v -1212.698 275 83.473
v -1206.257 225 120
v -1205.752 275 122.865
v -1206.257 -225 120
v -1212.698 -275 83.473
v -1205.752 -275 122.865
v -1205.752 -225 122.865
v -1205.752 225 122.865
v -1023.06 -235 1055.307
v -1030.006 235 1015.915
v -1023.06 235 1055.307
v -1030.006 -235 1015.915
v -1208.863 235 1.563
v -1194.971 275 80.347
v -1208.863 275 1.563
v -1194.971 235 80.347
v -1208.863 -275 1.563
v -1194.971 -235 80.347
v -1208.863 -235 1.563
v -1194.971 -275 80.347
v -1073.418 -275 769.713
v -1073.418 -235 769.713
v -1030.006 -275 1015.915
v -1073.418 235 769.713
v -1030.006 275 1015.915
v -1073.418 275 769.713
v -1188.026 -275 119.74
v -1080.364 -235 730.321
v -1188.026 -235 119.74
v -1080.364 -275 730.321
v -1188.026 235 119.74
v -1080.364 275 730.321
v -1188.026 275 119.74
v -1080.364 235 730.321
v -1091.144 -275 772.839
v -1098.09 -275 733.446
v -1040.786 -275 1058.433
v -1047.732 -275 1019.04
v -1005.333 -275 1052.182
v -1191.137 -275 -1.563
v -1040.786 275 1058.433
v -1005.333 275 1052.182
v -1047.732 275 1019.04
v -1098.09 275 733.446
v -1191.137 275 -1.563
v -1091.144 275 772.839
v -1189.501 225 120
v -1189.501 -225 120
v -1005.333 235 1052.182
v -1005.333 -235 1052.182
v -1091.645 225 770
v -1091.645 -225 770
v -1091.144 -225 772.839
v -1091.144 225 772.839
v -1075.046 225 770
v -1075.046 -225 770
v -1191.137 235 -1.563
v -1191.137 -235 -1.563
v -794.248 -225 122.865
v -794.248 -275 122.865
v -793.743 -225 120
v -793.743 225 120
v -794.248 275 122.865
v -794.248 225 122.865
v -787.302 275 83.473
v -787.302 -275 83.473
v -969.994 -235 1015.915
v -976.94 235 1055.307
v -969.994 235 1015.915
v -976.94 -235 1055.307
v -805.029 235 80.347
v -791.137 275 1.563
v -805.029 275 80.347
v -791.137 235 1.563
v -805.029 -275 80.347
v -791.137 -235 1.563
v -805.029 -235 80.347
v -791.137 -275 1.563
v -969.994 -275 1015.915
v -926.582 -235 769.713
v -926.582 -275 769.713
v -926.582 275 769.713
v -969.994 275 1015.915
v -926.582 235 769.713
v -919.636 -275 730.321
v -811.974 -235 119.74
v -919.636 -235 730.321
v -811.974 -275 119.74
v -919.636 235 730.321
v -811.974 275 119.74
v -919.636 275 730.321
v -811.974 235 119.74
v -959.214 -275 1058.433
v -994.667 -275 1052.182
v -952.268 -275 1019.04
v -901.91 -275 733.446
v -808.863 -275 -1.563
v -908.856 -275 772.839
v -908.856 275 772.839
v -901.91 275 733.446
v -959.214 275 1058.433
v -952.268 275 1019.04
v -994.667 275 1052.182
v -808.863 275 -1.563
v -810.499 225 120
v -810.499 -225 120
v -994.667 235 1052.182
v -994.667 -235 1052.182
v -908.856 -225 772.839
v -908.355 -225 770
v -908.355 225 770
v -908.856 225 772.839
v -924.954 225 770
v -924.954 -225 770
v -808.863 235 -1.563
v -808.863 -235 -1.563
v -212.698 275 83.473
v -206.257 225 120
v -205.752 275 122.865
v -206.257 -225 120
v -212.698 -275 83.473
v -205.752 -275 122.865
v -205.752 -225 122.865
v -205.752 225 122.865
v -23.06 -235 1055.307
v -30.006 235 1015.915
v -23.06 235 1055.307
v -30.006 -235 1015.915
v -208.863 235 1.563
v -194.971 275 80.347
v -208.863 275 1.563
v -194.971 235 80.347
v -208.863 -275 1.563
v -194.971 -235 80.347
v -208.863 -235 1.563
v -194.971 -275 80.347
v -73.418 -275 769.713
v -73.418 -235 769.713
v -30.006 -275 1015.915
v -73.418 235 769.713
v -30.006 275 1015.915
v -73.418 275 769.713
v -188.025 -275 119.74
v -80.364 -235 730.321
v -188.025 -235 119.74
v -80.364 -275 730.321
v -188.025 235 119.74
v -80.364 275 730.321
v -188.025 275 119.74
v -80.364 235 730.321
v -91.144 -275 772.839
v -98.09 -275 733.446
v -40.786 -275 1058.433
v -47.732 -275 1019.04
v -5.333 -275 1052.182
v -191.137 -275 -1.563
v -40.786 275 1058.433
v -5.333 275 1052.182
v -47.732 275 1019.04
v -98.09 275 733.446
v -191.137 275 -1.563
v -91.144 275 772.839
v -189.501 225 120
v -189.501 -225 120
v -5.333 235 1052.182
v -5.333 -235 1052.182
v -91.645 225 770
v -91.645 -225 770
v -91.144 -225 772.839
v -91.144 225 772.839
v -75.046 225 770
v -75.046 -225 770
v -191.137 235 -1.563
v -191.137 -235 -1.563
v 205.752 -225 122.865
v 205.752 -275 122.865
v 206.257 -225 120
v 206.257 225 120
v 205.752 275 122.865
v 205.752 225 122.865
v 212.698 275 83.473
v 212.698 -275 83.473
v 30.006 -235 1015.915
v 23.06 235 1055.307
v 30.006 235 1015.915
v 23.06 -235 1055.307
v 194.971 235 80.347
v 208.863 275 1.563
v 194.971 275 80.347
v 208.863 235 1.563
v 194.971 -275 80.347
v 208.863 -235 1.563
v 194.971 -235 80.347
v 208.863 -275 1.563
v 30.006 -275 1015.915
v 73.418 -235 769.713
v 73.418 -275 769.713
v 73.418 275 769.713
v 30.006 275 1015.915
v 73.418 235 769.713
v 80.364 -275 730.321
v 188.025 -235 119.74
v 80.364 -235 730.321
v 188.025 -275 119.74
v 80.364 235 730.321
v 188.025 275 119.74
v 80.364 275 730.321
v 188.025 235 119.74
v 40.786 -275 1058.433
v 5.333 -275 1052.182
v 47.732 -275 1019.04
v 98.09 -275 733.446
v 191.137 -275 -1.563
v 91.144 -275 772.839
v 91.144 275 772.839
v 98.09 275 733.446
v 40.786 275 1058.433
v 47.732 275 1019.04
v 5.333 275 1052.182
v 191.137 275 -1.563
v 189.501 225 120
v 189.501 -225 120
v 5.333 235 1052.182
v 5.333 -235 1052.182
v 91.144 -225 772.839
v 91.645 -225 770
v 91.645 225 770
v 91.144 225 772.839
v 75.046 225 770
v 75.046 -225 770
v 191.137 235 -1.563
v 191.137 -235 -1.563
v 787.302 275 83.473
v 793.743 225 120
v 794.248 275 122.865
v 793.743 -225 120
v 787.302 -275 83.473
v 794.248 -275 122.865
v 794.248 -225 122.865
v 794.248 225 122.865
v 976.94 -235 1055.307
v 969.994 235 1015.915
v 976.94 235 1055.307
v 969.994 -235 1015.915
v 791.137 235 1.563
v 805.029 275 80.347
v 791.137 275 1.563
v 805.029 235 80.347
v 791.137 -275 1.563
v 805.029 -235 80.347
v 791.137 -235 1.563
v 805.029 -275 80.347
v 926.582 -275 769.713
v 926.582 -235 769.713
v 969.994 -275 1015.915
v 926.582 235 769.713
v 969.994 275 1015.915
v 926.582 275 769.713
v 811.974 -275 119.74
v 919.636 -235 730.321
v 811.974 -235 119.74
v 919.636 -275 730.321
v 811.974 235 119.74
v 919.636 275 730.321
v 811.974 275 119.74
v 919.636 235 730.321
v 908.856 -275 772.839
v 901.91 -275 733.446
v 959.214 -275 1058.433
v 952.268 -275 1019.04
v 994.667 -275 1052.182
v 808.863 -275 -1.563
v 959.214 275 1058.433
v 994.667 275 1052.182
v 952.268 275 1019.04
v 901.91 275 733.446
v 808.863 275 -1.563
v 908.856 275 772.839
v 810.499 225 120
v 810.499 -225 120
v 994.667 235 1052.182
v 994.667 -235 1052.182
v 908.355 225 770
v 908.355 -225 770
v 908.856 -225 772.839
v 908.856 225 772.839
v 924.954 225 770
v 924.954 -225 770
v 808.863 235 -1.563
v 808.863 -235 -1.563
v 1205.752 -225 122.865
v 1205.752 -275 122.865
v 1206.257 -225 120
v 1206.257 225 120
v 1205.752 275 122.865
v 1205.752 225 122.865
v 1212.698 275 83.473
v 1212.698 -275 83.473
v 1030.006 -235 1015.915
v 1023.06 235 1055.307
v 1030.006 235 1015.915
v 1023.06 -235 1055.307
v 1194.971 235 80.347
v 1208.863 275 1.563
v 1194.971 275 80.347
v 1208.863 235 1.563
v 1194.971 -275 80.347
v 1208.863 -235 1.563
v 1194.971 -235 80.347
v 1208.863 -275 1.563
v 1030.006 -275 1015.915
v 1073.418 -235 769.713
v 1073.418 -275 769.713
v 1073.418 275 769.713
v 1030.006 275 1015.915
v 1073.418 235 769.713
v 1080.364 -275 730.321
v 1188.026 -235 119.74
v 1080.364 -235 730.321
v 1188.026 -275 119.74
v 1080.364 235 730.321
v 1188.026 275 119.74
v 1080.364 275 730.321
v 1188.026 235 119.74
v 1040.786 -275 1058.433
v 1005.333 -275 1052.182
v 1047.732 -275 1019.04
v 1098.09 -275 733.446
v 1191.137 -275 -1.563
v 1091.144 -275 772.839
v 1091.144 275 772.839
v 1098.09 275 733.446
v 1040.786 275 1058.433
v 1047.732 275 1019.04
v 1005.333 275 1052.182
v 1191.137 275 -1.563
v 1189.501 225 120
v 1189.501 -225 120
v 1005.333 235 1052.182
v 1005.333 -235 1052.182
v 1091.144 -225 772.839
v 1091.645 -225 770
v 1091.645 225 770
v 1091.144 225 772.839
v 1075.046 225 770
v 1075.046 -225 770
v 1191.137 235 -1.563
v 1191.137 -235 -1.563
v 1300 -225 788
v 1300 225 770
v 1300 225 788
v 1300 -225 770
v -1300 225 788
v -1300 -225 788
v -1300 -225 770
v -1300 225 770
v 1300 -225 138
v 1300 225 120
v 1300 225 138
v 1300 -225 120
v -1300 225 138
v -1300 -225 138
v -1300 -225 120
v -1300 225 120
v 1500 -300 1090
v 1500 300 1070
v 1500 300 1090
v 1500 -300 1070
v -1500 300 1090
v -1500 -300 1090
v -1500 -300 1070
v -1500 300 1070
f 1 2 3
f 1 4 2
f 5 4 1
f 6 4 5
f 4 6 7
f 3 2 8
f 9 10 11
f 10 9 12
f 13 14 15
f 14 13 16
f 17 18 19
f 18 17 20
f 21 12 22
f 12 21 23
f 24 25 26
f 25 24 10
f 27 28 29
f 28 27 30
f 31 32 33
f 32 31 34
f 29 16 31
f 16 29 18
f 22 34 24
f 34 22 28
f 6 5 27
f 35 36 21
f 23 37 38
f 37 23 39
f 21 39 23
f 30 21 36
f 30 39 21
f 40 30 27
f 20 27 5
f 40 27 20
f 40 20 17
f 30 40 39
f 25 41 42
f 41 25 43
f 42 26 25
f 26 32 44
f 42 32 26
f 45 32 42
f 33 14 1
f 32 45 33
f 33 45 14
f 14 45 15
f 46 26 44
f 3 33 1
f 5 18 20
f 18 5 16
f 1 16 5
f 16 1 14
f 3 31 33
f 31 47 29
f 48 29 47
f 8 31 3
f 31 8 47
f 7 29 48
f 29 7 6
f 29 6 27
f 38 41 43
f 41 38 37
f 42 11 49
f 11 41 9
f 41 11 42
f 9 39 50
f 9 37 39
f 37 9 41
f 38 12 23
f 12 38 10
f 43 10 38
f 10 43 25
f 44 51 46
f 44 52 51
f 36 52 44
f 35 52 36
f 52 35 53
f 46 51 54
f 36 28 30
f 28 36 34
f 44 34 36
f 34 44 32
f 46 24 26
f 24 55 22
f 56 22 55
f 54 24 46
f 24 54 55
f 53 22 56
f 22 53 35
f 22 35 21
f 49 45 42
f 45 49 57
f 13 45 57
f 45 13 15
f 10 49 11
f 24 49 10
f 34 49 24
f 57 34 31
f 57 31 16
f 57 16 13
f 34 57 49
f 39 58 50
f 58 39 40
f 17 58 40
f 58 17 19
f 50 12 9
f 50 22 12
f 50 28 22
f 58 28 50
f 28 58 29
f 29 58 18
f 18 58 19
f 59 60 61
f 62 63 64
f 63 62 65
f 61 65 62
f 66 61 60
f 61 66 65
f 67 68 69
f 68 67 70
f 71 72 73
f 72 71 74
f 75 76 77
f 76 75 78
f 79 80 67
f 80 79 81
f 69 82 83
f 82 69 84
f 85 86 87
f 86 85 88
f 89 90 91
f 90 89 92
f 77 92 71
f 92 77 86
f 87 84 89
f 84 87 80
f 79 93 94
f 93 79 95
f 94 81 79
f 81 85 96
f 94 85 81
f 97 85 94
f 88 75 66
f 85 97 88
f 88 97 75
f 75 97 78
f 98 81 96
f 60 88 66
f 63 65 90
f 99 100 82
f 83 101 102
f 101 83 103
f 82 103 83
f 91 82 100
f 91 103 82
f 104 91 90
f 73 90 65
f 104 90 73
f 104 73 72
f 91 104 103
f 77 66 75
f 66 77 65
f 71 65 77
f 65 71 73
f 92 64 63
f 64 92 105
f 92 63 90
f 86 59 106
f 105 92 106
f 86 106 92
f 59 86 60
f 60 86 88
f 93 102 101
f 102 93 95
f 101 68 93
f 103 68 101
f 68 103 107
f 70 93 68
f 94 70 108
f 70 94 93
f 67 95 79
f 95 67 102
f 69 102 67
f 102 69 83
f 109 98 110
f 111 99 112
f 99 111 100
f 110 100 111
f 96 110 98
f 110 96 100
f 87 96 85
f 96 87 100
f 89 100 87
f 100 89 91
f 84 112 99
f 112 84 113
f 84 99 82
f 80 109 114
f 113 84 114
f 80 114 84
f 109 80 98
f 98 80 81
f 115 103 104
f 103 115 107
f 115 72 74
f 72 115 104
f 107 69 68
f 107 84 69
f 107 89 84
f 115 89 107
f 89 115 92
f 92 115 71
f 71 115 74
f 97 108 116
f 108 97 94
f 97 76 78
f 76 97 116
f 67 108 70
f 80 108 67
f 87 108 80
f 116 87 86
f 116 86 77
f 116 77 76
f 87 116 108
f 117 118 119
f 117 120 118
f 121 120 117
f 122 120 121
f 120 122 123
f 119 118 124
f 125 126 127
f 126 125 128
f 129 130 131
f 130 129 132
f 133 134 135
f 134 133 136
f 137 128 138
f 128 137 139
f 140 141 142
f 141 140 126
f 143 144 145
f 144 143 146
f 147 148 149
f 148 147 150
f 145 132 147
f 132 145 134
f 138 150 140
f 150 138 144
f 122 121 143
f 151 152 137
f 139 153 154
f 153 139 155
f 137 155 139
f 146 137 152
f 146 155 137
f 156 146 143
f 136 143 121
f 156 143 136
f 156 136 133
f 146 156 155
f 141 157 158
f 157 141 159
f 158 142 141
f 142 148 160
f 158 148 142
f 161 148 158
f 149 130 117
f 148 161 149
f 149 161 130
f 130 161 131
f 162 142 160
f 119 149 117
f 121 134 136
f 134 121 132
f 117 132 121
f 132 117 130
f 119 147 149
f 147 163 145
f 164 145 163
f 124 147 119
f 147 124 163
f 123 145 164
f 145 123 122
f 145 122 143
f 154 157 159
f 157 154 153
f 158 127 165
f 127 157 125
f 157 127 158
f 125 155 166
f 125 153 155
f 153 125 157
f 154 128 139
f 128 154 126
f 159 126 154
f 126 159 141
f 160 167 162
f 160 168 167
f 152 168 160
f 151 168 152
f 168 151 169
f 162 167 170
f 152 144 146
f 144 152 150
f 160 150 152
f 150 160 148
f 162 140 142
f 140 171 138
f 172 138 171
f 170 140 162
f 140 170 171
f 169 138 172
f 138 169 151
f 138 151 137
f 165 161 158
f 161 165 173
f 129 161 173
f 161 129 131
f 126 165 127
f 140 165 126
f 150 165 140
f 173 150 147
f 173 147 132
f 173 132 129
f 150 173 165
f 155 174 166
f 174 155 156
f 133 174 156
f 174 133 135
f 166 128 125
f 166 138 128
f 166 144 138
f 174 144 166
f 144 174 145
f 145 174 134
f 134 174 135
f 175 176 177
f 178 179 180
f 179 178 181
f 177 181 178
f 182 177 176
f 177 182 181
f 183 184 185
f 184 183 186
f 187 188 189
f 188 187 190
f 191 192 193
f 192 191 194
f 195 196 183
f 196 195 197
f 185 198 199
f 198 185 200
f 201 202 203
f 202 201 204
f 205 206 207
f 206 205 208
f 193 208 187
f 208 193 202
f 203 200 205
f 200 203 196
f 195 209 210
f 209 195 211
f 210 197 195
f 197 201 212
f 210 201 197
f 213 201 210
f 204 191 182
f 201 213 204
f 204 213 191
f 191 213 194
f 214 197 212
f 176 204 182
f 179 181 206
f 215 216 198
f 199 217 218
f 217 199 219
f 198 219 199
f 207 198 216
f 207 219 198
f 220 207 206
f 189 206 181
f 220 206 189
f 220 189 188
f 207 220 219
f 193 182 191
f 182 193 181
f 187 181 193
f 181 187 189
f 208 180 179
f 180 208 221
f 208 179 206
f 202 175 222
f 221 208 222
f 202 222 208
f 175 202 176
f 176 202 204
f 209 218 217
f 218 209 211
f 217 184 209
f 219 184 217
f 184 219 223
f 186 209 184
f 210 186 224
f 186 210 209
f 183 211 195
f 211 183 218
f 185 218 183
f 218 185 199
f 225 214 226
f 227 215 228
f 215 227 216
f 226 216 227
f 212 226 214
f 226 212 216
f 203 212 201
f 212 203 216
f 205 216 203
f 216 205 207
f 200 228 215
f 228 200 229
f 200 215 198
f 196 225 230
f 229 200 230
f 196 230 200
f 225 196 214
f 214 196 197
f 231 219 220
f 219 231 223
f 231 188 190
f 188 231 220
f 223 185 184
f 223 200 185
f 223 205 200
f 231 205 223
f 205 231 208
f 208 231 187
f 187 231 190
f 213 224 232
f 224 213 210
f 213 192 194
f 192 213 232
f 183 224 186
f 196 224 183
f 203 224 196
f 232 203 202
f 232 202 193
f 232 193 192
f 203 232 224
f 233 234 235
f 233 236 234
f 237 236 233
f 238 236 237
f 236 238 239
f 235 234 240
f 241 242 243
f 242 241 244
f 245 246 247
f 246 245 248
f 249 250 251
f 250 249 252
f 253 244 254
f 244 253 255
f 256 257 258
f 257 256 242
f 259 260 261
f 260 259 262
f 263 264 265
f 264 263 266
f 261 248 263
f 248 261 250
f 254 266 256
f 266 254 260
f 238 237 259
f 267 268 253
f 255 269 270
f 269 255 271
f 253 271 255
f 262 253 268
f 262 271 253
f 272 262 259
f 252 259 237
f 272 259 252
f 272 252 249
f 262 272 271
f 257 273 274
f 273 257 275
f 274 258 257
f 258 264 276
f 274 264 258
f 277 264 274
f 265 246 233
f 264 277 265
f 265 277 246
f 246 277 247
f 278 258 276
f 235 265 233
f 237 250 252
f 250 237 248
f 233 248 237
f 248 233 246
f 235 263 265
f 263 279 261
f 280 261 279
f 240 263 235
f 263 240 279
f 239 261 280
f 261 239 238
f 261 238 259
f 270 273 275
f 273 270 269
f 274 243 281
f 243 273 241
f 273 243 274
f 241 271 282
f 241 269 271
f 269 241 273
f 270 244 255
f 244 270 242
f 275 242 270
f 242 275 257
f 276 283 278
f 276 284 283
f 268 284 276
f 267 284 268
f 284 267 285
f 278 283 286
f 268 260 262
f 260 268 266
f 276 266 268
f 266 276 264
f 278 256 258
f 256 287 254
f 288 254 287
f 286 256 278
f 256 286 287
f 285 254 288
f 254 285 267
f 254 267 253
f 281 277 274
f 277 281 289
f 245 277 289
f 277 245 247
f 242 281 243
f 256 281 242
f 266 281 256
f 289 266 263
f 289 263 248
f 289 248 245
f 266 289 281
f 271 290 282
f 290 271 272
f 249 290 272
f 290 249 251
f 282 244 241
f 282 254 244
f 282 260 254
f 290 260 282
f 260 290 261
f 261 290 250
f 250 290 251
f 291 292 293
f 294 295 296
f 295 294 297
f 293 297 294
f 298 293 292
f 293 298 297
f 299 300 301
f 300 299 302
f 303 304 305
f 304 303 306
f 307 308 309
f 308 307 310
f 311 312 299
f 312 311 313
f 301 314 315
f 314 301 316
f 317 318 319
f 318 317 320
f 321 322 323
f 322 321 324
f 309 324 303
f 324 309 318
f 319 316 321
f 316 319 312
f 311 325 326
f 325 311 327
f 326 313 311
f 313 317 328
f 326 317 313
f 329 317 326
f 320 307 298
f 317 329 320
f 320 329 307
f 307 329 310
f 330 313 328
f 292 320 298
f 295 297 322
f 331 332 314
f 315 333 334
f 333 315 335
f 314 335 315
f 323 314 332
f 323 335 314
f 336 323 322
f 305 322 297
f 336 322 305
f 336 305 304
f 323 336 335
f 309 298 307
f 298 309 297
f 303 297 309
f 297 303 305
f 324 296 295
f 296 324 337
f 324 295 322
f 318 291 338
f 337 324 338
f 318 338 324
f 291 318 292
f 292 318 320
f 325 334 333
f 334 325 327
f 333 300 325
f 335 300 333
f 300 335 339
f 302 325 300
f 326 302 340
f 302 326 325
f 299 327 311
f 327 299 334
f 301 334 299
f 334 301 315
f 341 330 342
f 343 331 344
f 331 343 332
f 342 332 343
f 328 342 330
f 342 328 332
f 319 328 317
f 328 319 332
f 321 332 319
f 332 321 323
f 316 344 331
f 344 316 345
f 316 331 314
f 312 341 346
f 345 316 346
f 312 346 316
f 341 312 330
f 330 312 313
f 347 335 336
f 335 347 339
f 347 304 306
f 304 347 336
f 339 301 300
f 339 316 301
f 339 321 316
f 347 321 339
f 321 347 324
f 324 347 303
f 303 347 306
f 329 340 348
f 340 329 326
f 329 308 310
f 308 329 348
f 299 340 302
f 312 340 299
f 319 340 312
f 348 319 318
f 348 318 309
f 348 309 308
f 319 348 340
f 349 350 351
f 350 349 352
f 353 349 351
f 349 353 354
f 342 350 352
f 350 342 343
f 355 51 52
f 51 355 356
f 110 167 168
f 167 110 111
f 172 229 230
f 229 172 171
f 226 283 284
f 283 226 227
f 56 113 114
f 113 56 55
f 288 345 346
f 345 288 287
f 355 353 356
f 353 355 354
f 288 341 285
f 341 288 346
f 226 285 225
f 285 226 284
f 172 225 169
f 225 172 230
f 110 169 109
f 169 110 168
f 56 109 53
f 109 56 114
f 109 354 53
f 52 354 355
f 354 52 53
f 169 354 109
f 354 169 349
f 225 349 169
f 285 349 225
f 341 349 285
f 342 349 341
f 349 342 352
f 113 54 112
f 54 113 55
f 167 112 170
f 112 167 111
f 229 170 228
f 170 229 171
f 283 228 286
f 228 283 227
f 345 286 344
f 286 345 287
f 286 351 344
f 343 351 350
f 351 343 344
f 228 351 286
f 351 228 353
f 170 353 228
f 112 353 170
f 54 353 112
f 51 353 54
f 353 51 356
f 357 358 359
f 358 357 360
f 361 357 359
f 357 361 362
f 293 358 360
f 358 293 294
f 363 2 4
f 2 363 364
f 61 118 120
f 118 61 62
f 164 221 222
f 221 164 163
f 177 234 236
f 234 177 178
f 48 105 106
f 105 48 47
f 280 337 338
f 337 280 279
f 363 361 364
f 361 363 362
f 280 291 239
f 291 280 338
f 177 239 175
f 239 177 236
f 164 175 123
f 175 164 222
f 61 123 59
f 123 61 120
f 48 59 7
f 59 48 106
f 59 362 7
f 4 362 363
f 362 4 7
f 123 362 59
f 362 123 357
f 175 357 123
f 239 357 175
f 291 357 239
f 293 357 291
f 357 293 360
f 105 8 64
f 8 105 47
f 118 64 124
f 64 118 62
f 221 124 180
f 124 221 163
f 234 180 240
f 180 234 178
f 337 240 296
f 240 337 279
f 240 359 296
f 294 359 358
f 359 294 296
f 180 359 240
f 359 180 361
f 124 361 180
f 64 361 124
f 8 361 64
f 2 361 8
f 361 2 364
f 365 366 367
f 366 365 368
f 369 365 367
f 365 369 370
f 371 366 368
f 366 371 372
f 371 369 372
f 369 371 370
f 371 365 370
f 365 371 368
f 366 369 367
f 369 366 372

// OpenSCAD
// file: wood.scad
$t = 20;

function odd(x) = (x % 2) == 1;

module beam(length = 1200, width = 42, depth = 42) {
	echo("beam", [length, width, depth]);
	cube([width, depth, length]);
}

module plank(length, width = 200, thickness = $t) {
	echo("plank", [length, width, thickness]);
	cube([length, width, thickness]);
}

module panel(length, width = 600, thickness = $t) {
	plank_width = width / 6;
	count = floor(width / plank_width);
	
	for (x = [0:1:count-1]) {
		color(odd(x) ? [0.8, 0.4, 0.1] : [0.7, 0.4, 0.1])
		translate([0, x * plank_width, 0]) plank(length, plank_width, thickness);
	}
}

module edged_panel(length, width = 600, thickness = $t, plank_width = 100, backing_width = 40) {
	count = floor(width / plank_width);
	
	translate([0, 0, thickness]) {
		for (x = [0:1:count-1]) {
			color(odd(x) ? [0.8, 0.4, 0.1] : [0.7, 0.4, 0.1])
			translate([0, x * plank_width, 0]) plank(length, plank_width, thickness);
		}
	}
	
	color([0.8, 0.45, 0.1])
	translate([0, 0, 0]) {
		plank(length, backing_width);
		translate([0, width - backing_width, 0]) plank(length, backing_width);
	}
	
	color([0.8, 0.35, 0.3])
	translate([0, width - backing_width, 0]) rotate([0, 0, -90]) {
		plank(width - backing_width*2, backing_width);
		translate([0, length-backing_width, 0]) plank(width - backing_width*2, backing_width);
	}
}
// main file
use <wood.scad>;

height = 1070;

module leg(height = height, width = 550) {
	beam_width = 40;
	beam_thickness = 18;
	
	translate([-beam_thickness/2, width/2, 0]) {
		translate([0, -beam_width, 0]) beam(height, beam_thickness, beam_width);
	}
	
	translate([-beam_thickness/2, -width/2, 0]) {
		translate([0, 0, 0]) beam(height, beam_thickness, beam_width);
	}
	
	translate([-beam_thickness*1.5, 0, 0]) {
		translate([0, width/2, beam_width*2])
		rotate([90, 0, 0])
		beam(width, beam_thickness, beam_width);
		
		translate([0, width/2, height - beam_width])
		rotate([90, 0, 0])
		beam(width, beam_thickness, beam_width);
		
		translate([0, width/2, height - beam_width * 2 - 250])
		rotate([90, 0, 0])
		beam(width, beam_thickness, beam_width);
	}
}

module aframe() {
	translate([-200, 0, 0])
	rotate([0, 10, 0])
	leg();
	
	translate([200, 0, 0])
	rotate([0, -10, 0])
	mirror([1, 0, 0])
	leg();
}

translate([-1000, 0, 0])
aframe();

translate([0, 0, 0])
aframe();

translate([1000, 0, 0])
aframe();

translate([-2600/2, -450/2, height-300]) {
	panel(2600, width=450, thickness=18);
}

translate([-2600/2, -450/2, height-950]) {
	panel(2600, width=450, thickness=18);
}

translate([-3000/2, -600/2, height]) {
	panel(3000);
}
